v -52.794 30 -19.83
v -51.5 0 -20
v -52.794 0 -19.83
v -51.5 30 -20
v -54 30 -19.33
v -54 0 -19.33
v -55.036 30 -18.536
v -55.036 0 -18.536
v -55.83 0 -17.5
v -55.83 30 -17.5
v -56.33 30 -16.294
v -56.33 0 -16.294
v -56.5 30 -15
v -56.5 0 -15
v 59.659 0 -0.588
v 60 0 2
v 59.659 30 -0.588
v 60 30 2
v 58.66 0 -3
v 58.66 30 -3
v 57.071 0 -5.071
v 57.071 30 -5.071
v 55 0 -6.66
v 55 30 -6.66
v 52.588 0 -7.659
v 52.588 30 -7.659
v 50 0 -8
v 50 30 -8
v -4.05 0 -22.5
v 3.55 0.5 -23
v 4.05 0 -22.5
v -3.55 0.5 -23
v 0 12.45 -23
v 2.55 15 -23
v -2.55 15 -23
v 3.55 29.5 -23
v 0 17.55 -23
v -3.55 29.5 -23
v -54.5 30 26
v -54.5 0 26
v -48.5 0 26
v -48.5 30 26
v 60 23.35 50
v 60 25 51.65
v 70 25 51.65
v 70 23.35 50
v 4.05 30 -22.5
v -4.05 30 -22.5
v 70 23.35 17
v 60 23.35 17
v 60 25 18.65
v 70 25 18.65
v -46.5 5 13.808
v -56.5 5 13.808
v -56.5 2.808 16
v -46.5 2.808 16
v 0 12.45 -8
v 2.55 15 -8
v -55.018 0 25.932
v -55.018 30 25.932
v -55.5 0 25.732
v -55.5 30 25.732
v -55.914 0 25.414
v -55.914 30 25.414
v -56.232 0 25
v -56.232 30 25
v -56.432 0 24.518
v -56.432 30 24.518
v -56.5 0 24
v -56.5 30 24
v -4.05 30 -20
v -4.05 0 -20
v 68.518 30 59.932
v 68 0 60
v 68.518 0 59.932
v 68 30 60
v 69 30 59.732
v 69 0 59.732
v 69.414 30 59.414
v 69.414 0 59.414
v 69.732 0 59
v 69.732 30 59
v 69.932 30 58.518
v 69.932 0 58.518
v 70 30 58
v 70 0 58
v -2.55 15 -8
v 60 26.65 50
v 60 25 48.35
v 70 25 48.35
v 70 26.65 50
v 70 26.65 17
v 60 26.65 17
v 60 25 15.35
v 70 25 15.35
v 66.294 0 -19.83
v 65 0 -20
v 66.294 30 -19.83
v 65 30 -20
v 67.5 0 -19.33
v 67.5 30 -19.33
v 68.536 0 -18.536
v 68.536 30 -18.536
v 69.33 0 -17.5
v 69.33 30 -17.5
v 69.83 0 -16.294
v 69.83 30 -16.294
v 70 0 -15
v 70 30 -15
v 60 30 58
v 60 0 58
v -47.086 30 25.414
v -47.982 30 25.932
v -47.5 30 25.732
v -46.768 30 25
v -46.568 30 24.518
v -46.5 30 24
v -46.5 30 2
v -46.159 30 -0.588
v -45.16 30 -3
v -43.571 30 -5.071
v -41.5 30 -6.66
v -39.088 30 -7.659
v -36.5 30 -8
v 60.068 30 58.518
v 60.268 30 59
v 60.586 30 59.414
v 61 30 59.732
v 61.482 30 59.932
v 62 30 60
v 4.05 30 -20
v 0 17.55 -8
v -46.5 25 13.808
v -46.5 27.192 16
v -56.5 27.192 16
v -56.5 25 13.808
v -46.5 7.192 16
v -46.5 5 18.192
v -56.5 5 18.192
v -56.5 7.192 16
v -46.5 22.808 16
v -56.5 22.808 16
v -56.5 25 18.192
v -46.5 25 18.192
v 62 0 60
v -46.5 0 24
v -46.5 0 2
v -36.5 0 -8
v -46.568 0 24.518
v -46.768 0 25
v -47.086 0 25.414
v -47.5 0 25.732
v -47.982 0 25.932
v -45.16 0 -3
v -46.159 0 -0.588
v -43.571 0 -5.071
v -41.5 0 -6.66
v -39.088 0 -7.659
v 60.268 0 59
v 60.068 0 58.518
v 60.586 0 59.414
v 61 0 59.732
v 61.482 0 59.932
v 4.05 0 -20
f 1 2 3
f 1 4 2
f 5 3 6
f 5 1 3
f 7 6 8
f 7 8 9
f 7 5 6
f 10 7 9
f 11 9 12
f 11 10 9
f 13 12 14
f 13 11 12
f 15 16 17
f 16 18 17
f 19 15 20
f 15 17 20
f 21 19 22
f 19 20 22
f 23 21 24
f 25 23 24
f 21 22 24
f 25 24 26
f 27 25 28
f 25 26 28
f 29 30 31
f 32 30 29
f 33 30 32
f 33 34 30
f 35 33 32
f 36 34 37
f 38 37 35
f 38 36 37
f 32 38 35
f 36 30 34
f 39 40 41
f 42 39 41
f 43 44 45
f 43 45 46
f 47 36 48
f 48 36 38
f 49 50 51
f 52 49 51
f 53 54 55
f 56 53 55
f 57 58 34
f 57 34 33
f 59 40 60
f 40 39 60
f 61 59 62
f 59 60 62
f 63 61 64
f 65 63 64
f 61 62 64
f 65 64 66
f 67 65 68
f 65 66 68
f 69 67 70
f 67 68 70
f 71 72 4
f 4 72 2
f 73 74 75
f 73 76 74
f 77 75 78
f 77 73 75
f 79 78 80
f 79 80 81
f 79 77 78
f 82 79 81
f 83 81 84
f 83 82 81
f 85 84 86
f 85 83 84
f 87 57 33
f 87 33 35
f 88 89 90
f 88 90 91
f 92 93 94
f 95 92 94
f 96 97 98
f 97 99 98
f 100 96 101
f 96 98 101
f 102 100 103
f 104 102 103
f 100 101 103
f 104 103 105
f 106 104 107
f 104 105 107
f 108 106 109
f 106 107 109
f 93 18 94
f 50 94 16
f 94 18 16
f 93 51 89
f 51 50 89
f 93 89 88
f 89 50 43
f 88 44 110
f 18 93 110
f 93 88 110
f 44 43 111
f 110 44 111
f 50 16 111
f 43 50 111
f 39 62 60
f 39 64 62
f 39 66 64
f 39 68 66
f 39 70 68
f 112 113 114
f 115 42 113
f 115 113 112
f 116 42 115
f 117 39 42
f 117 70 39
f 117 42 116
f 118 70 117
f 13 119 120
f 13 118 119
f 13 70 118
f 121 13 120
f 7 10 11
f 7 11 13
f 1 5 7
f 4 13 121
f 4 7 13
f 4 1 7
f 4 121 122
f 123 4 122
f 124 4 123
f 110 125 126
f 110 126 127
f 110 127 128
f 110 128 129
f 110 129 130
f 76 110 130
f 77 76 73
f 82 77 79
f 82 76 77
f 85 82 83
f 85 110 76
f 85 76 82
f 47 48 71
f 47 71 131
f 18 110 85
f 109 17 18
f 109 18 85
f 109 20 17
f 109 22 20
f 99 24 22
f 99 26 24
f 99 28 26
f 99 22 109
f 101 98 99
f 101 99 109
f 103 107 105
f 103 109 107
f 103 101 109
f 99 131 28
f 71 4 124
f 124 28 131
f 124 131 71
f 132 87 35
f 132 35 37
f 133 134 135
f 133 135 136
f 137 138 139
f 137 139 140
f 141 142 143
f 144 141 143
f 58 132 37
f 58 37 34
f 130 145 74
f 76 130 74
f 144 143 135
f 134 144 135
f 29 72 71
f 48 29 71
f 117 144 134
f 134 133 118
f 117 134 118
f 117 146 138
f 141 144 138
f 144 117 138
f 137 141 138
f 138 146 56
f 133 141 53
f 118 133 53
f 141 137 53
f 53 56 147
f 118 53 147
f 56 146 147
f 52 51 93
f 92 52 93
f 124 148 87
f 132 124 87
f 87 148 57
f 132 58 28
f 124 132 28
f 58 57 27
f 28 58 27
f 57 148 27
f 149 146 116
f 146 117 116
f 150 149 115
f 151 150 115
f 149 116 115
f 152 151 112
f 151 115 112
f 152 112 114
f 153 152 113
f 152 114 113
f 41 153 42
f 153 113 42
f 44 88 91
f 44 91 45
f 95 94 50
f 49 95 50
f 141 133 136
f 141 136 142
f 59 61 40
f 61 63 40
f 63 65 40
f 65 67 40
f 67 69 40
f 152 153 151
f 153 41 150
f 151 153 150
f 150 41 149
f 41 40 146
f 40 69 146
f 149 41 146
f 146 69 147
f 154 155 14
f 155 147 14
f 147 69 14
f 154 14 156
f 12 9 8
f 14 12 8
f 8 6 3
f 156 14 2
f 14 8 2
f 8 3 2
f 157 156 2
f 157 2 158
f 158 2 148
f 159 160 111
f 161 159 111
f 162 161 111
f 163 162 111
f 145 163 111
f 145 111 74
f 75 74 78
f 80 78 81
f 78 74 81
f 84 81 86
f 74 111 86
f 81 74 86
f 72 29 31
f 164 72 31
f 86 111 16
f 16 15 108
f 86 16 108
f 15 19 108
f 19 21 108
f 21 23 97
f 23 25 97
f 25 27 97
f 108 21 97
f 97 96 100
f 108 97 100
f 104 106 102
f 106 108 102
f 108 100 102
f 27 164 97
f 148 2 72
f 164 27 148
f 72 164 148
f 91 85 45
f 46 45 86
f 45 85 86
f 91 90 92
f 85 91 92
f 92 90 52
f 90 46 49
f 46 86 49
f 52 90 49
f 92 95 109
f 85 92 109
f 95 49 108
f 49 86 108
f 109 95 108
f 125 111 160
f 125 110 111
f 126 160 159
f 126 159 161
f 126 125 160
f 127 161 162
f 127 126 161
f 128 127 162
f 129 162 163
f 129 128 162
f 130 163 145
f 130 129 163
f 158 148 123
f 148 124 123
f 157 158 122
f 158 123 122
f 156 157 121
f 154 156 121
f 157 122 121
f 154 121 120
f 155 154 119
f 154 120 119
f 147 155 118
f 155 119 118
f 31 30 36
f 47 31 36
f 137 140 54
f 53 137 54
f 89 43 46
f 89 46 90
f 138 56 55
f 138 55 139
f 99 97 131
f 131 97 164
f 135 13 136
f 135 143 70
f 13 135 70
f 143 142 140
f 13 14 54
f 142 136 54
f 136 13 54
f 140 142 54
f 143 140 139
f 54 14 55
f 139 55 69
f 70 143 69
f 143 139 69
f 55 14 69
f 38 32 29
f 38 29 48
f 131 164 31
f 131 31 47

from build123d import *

# Parameters (mm, degrees)
AUFSATZ_LINEAR_AUSTRAGEN1_DEPTH = 30
SKIZZE5_W                       = 8.1
SKIZZE5_H                       = 30
AUFSATZ_LINEAR_AUSTRAGEN2_DEPTH = 3
FASE2_SIZE                      = 0.5
VERRUNDUNG1_R                   = 5
VERRUNDUNG2_R                   = 10
SCHNITT_LINEAR_AUSTRAGEN1_DEPTH = 135.433068848
VERRUNDUNG3_R                   = 2
SCHNITT_LINEAR_AUSTRAGEN2_DEPTH = 97.953597148
SCHNITT_LINEAR_AUSTRAGEN3_DEPTH = 103.097992145


with BuildPart() as part:
    # Skizze1 → Aufsatz-Linear austragen1 (new body)
    with BuildSketch(Plane(origin=(0, 0, 0), x_dir=(1, 0, 0), z_dir=(0, 1, 0))):
        Polygon((-56.5, 0), (-56.5, -26), (-46.5, -26), (-46.5, 8), (60, 8), (60, -60), (70, -60), (70, 0), (70, 20), (-56.5, 20), align=None)
    extrude(amount=AUFSATZ_LINEAR_AUSTRAGEN1_DEPTH)

    # Skizze5 → Aufsatz-Linear austragen2 (add)
    with BuildSketch(Plane(origin=(0, 0, -20), x_dir=(-1, 0, 0), z_dir=(0, 0, -1))):
        with Locations((0, 15)):
            Rectangle(SKIZZE5_W, SKIZZE5_H)
    extrude(amount=AUFSATZ_LINEAR_AUSTRAGEN2_DEPTH)

    # Fase2
    fase2_edges = [part.edges().sort_by_distance(p)[0] for p in [
        (-4.05, 15, -23),
        (0, 0, -23),
        (4.05, 15, -23),
        (0, 30, -23),
    ]]
    chamfer(fase2_edges, length=FASE2_SIZE)

    # Verrundung1
    verrundung1_edges = [part.edges().sort_by_distance(p)[0] for p in [
        (70, 15, -20),
        (-56.5, 15, -20),
    ]]
    fillet(verrundung1_edges, radius=VERRUNDUNG1_R)

    # Verrundung2
    verrundung2_edges = [part.edges().sort_by_distance(p)[0] for p in [
        (60, 15, -8),
        (-46.5, 15, -8),
    ]]
    fillet(verrundung2_edges, radius=VERRUNDUNG2_R)

    # Skizze8 → Schnitt-Linear austragen1 (cut, through all)
    with BuildSketch(Plane.ZY.offset(-60)):
        Polygon((17, 26.65), (15.35, 25), (17, 23.35), (18.65, 25), align=None)
        Polygon((48.35, 25), (50, 26.65), (51.65, 25), (50, 23.35), align=None)
    extrude(amount=-SCHNITT_LINEAR_AUSTRAGEN1_DEPTH, mode=Mode.SUBTRACT)

    # Verrundung3
    verrundung3_edges = [part.edges().sort_by_distance(p)[0] for p in [
        (70, 15, 60),
        (60, 15, 60),
        (-46.5, 15, 26),
        (-56.5, 15, 26),
    ]]
    fillet(verrundung3_edges, radius=VERRUNDUNG3_R)

    # Skizze9 → Schnitt-Linear austragen2 (cut, through all)
    with BuildSketch(Plane(origin=(0, 0, 0), x_dir=(0, 0, -1), z_dir=(1, 0, 0))):
        Polygon((-16, 27.192031022), (-13.807968978, 25), (-16, 22.807968978), (-18.192031022, 25), align=None)
        Polygon((-16, 7.192031022), (-13.807968978, 5), (-16, 2.807968978), (-18.192031022, 5), align=None)
    extrude(amount=-SCHNITT_LINEAR_AUSTRAGEN2_DEPTH, mode=Mode.SUBTRACT)

    # Skizze10 → Schnitt-Linear austragen3 (cut, through all)
    with BuildSketch(Plane.XY.offset(-8)):
        Polygon((0, 17.55), (2.55, 15), (0, 12.45), (-2.55, 15), align=None)
    extrude(amount=-SCHNITT_LINEAR_AUSTRAGEN3_DEPTH, mode=Mode.SUBTRACT)


solid = part.part
